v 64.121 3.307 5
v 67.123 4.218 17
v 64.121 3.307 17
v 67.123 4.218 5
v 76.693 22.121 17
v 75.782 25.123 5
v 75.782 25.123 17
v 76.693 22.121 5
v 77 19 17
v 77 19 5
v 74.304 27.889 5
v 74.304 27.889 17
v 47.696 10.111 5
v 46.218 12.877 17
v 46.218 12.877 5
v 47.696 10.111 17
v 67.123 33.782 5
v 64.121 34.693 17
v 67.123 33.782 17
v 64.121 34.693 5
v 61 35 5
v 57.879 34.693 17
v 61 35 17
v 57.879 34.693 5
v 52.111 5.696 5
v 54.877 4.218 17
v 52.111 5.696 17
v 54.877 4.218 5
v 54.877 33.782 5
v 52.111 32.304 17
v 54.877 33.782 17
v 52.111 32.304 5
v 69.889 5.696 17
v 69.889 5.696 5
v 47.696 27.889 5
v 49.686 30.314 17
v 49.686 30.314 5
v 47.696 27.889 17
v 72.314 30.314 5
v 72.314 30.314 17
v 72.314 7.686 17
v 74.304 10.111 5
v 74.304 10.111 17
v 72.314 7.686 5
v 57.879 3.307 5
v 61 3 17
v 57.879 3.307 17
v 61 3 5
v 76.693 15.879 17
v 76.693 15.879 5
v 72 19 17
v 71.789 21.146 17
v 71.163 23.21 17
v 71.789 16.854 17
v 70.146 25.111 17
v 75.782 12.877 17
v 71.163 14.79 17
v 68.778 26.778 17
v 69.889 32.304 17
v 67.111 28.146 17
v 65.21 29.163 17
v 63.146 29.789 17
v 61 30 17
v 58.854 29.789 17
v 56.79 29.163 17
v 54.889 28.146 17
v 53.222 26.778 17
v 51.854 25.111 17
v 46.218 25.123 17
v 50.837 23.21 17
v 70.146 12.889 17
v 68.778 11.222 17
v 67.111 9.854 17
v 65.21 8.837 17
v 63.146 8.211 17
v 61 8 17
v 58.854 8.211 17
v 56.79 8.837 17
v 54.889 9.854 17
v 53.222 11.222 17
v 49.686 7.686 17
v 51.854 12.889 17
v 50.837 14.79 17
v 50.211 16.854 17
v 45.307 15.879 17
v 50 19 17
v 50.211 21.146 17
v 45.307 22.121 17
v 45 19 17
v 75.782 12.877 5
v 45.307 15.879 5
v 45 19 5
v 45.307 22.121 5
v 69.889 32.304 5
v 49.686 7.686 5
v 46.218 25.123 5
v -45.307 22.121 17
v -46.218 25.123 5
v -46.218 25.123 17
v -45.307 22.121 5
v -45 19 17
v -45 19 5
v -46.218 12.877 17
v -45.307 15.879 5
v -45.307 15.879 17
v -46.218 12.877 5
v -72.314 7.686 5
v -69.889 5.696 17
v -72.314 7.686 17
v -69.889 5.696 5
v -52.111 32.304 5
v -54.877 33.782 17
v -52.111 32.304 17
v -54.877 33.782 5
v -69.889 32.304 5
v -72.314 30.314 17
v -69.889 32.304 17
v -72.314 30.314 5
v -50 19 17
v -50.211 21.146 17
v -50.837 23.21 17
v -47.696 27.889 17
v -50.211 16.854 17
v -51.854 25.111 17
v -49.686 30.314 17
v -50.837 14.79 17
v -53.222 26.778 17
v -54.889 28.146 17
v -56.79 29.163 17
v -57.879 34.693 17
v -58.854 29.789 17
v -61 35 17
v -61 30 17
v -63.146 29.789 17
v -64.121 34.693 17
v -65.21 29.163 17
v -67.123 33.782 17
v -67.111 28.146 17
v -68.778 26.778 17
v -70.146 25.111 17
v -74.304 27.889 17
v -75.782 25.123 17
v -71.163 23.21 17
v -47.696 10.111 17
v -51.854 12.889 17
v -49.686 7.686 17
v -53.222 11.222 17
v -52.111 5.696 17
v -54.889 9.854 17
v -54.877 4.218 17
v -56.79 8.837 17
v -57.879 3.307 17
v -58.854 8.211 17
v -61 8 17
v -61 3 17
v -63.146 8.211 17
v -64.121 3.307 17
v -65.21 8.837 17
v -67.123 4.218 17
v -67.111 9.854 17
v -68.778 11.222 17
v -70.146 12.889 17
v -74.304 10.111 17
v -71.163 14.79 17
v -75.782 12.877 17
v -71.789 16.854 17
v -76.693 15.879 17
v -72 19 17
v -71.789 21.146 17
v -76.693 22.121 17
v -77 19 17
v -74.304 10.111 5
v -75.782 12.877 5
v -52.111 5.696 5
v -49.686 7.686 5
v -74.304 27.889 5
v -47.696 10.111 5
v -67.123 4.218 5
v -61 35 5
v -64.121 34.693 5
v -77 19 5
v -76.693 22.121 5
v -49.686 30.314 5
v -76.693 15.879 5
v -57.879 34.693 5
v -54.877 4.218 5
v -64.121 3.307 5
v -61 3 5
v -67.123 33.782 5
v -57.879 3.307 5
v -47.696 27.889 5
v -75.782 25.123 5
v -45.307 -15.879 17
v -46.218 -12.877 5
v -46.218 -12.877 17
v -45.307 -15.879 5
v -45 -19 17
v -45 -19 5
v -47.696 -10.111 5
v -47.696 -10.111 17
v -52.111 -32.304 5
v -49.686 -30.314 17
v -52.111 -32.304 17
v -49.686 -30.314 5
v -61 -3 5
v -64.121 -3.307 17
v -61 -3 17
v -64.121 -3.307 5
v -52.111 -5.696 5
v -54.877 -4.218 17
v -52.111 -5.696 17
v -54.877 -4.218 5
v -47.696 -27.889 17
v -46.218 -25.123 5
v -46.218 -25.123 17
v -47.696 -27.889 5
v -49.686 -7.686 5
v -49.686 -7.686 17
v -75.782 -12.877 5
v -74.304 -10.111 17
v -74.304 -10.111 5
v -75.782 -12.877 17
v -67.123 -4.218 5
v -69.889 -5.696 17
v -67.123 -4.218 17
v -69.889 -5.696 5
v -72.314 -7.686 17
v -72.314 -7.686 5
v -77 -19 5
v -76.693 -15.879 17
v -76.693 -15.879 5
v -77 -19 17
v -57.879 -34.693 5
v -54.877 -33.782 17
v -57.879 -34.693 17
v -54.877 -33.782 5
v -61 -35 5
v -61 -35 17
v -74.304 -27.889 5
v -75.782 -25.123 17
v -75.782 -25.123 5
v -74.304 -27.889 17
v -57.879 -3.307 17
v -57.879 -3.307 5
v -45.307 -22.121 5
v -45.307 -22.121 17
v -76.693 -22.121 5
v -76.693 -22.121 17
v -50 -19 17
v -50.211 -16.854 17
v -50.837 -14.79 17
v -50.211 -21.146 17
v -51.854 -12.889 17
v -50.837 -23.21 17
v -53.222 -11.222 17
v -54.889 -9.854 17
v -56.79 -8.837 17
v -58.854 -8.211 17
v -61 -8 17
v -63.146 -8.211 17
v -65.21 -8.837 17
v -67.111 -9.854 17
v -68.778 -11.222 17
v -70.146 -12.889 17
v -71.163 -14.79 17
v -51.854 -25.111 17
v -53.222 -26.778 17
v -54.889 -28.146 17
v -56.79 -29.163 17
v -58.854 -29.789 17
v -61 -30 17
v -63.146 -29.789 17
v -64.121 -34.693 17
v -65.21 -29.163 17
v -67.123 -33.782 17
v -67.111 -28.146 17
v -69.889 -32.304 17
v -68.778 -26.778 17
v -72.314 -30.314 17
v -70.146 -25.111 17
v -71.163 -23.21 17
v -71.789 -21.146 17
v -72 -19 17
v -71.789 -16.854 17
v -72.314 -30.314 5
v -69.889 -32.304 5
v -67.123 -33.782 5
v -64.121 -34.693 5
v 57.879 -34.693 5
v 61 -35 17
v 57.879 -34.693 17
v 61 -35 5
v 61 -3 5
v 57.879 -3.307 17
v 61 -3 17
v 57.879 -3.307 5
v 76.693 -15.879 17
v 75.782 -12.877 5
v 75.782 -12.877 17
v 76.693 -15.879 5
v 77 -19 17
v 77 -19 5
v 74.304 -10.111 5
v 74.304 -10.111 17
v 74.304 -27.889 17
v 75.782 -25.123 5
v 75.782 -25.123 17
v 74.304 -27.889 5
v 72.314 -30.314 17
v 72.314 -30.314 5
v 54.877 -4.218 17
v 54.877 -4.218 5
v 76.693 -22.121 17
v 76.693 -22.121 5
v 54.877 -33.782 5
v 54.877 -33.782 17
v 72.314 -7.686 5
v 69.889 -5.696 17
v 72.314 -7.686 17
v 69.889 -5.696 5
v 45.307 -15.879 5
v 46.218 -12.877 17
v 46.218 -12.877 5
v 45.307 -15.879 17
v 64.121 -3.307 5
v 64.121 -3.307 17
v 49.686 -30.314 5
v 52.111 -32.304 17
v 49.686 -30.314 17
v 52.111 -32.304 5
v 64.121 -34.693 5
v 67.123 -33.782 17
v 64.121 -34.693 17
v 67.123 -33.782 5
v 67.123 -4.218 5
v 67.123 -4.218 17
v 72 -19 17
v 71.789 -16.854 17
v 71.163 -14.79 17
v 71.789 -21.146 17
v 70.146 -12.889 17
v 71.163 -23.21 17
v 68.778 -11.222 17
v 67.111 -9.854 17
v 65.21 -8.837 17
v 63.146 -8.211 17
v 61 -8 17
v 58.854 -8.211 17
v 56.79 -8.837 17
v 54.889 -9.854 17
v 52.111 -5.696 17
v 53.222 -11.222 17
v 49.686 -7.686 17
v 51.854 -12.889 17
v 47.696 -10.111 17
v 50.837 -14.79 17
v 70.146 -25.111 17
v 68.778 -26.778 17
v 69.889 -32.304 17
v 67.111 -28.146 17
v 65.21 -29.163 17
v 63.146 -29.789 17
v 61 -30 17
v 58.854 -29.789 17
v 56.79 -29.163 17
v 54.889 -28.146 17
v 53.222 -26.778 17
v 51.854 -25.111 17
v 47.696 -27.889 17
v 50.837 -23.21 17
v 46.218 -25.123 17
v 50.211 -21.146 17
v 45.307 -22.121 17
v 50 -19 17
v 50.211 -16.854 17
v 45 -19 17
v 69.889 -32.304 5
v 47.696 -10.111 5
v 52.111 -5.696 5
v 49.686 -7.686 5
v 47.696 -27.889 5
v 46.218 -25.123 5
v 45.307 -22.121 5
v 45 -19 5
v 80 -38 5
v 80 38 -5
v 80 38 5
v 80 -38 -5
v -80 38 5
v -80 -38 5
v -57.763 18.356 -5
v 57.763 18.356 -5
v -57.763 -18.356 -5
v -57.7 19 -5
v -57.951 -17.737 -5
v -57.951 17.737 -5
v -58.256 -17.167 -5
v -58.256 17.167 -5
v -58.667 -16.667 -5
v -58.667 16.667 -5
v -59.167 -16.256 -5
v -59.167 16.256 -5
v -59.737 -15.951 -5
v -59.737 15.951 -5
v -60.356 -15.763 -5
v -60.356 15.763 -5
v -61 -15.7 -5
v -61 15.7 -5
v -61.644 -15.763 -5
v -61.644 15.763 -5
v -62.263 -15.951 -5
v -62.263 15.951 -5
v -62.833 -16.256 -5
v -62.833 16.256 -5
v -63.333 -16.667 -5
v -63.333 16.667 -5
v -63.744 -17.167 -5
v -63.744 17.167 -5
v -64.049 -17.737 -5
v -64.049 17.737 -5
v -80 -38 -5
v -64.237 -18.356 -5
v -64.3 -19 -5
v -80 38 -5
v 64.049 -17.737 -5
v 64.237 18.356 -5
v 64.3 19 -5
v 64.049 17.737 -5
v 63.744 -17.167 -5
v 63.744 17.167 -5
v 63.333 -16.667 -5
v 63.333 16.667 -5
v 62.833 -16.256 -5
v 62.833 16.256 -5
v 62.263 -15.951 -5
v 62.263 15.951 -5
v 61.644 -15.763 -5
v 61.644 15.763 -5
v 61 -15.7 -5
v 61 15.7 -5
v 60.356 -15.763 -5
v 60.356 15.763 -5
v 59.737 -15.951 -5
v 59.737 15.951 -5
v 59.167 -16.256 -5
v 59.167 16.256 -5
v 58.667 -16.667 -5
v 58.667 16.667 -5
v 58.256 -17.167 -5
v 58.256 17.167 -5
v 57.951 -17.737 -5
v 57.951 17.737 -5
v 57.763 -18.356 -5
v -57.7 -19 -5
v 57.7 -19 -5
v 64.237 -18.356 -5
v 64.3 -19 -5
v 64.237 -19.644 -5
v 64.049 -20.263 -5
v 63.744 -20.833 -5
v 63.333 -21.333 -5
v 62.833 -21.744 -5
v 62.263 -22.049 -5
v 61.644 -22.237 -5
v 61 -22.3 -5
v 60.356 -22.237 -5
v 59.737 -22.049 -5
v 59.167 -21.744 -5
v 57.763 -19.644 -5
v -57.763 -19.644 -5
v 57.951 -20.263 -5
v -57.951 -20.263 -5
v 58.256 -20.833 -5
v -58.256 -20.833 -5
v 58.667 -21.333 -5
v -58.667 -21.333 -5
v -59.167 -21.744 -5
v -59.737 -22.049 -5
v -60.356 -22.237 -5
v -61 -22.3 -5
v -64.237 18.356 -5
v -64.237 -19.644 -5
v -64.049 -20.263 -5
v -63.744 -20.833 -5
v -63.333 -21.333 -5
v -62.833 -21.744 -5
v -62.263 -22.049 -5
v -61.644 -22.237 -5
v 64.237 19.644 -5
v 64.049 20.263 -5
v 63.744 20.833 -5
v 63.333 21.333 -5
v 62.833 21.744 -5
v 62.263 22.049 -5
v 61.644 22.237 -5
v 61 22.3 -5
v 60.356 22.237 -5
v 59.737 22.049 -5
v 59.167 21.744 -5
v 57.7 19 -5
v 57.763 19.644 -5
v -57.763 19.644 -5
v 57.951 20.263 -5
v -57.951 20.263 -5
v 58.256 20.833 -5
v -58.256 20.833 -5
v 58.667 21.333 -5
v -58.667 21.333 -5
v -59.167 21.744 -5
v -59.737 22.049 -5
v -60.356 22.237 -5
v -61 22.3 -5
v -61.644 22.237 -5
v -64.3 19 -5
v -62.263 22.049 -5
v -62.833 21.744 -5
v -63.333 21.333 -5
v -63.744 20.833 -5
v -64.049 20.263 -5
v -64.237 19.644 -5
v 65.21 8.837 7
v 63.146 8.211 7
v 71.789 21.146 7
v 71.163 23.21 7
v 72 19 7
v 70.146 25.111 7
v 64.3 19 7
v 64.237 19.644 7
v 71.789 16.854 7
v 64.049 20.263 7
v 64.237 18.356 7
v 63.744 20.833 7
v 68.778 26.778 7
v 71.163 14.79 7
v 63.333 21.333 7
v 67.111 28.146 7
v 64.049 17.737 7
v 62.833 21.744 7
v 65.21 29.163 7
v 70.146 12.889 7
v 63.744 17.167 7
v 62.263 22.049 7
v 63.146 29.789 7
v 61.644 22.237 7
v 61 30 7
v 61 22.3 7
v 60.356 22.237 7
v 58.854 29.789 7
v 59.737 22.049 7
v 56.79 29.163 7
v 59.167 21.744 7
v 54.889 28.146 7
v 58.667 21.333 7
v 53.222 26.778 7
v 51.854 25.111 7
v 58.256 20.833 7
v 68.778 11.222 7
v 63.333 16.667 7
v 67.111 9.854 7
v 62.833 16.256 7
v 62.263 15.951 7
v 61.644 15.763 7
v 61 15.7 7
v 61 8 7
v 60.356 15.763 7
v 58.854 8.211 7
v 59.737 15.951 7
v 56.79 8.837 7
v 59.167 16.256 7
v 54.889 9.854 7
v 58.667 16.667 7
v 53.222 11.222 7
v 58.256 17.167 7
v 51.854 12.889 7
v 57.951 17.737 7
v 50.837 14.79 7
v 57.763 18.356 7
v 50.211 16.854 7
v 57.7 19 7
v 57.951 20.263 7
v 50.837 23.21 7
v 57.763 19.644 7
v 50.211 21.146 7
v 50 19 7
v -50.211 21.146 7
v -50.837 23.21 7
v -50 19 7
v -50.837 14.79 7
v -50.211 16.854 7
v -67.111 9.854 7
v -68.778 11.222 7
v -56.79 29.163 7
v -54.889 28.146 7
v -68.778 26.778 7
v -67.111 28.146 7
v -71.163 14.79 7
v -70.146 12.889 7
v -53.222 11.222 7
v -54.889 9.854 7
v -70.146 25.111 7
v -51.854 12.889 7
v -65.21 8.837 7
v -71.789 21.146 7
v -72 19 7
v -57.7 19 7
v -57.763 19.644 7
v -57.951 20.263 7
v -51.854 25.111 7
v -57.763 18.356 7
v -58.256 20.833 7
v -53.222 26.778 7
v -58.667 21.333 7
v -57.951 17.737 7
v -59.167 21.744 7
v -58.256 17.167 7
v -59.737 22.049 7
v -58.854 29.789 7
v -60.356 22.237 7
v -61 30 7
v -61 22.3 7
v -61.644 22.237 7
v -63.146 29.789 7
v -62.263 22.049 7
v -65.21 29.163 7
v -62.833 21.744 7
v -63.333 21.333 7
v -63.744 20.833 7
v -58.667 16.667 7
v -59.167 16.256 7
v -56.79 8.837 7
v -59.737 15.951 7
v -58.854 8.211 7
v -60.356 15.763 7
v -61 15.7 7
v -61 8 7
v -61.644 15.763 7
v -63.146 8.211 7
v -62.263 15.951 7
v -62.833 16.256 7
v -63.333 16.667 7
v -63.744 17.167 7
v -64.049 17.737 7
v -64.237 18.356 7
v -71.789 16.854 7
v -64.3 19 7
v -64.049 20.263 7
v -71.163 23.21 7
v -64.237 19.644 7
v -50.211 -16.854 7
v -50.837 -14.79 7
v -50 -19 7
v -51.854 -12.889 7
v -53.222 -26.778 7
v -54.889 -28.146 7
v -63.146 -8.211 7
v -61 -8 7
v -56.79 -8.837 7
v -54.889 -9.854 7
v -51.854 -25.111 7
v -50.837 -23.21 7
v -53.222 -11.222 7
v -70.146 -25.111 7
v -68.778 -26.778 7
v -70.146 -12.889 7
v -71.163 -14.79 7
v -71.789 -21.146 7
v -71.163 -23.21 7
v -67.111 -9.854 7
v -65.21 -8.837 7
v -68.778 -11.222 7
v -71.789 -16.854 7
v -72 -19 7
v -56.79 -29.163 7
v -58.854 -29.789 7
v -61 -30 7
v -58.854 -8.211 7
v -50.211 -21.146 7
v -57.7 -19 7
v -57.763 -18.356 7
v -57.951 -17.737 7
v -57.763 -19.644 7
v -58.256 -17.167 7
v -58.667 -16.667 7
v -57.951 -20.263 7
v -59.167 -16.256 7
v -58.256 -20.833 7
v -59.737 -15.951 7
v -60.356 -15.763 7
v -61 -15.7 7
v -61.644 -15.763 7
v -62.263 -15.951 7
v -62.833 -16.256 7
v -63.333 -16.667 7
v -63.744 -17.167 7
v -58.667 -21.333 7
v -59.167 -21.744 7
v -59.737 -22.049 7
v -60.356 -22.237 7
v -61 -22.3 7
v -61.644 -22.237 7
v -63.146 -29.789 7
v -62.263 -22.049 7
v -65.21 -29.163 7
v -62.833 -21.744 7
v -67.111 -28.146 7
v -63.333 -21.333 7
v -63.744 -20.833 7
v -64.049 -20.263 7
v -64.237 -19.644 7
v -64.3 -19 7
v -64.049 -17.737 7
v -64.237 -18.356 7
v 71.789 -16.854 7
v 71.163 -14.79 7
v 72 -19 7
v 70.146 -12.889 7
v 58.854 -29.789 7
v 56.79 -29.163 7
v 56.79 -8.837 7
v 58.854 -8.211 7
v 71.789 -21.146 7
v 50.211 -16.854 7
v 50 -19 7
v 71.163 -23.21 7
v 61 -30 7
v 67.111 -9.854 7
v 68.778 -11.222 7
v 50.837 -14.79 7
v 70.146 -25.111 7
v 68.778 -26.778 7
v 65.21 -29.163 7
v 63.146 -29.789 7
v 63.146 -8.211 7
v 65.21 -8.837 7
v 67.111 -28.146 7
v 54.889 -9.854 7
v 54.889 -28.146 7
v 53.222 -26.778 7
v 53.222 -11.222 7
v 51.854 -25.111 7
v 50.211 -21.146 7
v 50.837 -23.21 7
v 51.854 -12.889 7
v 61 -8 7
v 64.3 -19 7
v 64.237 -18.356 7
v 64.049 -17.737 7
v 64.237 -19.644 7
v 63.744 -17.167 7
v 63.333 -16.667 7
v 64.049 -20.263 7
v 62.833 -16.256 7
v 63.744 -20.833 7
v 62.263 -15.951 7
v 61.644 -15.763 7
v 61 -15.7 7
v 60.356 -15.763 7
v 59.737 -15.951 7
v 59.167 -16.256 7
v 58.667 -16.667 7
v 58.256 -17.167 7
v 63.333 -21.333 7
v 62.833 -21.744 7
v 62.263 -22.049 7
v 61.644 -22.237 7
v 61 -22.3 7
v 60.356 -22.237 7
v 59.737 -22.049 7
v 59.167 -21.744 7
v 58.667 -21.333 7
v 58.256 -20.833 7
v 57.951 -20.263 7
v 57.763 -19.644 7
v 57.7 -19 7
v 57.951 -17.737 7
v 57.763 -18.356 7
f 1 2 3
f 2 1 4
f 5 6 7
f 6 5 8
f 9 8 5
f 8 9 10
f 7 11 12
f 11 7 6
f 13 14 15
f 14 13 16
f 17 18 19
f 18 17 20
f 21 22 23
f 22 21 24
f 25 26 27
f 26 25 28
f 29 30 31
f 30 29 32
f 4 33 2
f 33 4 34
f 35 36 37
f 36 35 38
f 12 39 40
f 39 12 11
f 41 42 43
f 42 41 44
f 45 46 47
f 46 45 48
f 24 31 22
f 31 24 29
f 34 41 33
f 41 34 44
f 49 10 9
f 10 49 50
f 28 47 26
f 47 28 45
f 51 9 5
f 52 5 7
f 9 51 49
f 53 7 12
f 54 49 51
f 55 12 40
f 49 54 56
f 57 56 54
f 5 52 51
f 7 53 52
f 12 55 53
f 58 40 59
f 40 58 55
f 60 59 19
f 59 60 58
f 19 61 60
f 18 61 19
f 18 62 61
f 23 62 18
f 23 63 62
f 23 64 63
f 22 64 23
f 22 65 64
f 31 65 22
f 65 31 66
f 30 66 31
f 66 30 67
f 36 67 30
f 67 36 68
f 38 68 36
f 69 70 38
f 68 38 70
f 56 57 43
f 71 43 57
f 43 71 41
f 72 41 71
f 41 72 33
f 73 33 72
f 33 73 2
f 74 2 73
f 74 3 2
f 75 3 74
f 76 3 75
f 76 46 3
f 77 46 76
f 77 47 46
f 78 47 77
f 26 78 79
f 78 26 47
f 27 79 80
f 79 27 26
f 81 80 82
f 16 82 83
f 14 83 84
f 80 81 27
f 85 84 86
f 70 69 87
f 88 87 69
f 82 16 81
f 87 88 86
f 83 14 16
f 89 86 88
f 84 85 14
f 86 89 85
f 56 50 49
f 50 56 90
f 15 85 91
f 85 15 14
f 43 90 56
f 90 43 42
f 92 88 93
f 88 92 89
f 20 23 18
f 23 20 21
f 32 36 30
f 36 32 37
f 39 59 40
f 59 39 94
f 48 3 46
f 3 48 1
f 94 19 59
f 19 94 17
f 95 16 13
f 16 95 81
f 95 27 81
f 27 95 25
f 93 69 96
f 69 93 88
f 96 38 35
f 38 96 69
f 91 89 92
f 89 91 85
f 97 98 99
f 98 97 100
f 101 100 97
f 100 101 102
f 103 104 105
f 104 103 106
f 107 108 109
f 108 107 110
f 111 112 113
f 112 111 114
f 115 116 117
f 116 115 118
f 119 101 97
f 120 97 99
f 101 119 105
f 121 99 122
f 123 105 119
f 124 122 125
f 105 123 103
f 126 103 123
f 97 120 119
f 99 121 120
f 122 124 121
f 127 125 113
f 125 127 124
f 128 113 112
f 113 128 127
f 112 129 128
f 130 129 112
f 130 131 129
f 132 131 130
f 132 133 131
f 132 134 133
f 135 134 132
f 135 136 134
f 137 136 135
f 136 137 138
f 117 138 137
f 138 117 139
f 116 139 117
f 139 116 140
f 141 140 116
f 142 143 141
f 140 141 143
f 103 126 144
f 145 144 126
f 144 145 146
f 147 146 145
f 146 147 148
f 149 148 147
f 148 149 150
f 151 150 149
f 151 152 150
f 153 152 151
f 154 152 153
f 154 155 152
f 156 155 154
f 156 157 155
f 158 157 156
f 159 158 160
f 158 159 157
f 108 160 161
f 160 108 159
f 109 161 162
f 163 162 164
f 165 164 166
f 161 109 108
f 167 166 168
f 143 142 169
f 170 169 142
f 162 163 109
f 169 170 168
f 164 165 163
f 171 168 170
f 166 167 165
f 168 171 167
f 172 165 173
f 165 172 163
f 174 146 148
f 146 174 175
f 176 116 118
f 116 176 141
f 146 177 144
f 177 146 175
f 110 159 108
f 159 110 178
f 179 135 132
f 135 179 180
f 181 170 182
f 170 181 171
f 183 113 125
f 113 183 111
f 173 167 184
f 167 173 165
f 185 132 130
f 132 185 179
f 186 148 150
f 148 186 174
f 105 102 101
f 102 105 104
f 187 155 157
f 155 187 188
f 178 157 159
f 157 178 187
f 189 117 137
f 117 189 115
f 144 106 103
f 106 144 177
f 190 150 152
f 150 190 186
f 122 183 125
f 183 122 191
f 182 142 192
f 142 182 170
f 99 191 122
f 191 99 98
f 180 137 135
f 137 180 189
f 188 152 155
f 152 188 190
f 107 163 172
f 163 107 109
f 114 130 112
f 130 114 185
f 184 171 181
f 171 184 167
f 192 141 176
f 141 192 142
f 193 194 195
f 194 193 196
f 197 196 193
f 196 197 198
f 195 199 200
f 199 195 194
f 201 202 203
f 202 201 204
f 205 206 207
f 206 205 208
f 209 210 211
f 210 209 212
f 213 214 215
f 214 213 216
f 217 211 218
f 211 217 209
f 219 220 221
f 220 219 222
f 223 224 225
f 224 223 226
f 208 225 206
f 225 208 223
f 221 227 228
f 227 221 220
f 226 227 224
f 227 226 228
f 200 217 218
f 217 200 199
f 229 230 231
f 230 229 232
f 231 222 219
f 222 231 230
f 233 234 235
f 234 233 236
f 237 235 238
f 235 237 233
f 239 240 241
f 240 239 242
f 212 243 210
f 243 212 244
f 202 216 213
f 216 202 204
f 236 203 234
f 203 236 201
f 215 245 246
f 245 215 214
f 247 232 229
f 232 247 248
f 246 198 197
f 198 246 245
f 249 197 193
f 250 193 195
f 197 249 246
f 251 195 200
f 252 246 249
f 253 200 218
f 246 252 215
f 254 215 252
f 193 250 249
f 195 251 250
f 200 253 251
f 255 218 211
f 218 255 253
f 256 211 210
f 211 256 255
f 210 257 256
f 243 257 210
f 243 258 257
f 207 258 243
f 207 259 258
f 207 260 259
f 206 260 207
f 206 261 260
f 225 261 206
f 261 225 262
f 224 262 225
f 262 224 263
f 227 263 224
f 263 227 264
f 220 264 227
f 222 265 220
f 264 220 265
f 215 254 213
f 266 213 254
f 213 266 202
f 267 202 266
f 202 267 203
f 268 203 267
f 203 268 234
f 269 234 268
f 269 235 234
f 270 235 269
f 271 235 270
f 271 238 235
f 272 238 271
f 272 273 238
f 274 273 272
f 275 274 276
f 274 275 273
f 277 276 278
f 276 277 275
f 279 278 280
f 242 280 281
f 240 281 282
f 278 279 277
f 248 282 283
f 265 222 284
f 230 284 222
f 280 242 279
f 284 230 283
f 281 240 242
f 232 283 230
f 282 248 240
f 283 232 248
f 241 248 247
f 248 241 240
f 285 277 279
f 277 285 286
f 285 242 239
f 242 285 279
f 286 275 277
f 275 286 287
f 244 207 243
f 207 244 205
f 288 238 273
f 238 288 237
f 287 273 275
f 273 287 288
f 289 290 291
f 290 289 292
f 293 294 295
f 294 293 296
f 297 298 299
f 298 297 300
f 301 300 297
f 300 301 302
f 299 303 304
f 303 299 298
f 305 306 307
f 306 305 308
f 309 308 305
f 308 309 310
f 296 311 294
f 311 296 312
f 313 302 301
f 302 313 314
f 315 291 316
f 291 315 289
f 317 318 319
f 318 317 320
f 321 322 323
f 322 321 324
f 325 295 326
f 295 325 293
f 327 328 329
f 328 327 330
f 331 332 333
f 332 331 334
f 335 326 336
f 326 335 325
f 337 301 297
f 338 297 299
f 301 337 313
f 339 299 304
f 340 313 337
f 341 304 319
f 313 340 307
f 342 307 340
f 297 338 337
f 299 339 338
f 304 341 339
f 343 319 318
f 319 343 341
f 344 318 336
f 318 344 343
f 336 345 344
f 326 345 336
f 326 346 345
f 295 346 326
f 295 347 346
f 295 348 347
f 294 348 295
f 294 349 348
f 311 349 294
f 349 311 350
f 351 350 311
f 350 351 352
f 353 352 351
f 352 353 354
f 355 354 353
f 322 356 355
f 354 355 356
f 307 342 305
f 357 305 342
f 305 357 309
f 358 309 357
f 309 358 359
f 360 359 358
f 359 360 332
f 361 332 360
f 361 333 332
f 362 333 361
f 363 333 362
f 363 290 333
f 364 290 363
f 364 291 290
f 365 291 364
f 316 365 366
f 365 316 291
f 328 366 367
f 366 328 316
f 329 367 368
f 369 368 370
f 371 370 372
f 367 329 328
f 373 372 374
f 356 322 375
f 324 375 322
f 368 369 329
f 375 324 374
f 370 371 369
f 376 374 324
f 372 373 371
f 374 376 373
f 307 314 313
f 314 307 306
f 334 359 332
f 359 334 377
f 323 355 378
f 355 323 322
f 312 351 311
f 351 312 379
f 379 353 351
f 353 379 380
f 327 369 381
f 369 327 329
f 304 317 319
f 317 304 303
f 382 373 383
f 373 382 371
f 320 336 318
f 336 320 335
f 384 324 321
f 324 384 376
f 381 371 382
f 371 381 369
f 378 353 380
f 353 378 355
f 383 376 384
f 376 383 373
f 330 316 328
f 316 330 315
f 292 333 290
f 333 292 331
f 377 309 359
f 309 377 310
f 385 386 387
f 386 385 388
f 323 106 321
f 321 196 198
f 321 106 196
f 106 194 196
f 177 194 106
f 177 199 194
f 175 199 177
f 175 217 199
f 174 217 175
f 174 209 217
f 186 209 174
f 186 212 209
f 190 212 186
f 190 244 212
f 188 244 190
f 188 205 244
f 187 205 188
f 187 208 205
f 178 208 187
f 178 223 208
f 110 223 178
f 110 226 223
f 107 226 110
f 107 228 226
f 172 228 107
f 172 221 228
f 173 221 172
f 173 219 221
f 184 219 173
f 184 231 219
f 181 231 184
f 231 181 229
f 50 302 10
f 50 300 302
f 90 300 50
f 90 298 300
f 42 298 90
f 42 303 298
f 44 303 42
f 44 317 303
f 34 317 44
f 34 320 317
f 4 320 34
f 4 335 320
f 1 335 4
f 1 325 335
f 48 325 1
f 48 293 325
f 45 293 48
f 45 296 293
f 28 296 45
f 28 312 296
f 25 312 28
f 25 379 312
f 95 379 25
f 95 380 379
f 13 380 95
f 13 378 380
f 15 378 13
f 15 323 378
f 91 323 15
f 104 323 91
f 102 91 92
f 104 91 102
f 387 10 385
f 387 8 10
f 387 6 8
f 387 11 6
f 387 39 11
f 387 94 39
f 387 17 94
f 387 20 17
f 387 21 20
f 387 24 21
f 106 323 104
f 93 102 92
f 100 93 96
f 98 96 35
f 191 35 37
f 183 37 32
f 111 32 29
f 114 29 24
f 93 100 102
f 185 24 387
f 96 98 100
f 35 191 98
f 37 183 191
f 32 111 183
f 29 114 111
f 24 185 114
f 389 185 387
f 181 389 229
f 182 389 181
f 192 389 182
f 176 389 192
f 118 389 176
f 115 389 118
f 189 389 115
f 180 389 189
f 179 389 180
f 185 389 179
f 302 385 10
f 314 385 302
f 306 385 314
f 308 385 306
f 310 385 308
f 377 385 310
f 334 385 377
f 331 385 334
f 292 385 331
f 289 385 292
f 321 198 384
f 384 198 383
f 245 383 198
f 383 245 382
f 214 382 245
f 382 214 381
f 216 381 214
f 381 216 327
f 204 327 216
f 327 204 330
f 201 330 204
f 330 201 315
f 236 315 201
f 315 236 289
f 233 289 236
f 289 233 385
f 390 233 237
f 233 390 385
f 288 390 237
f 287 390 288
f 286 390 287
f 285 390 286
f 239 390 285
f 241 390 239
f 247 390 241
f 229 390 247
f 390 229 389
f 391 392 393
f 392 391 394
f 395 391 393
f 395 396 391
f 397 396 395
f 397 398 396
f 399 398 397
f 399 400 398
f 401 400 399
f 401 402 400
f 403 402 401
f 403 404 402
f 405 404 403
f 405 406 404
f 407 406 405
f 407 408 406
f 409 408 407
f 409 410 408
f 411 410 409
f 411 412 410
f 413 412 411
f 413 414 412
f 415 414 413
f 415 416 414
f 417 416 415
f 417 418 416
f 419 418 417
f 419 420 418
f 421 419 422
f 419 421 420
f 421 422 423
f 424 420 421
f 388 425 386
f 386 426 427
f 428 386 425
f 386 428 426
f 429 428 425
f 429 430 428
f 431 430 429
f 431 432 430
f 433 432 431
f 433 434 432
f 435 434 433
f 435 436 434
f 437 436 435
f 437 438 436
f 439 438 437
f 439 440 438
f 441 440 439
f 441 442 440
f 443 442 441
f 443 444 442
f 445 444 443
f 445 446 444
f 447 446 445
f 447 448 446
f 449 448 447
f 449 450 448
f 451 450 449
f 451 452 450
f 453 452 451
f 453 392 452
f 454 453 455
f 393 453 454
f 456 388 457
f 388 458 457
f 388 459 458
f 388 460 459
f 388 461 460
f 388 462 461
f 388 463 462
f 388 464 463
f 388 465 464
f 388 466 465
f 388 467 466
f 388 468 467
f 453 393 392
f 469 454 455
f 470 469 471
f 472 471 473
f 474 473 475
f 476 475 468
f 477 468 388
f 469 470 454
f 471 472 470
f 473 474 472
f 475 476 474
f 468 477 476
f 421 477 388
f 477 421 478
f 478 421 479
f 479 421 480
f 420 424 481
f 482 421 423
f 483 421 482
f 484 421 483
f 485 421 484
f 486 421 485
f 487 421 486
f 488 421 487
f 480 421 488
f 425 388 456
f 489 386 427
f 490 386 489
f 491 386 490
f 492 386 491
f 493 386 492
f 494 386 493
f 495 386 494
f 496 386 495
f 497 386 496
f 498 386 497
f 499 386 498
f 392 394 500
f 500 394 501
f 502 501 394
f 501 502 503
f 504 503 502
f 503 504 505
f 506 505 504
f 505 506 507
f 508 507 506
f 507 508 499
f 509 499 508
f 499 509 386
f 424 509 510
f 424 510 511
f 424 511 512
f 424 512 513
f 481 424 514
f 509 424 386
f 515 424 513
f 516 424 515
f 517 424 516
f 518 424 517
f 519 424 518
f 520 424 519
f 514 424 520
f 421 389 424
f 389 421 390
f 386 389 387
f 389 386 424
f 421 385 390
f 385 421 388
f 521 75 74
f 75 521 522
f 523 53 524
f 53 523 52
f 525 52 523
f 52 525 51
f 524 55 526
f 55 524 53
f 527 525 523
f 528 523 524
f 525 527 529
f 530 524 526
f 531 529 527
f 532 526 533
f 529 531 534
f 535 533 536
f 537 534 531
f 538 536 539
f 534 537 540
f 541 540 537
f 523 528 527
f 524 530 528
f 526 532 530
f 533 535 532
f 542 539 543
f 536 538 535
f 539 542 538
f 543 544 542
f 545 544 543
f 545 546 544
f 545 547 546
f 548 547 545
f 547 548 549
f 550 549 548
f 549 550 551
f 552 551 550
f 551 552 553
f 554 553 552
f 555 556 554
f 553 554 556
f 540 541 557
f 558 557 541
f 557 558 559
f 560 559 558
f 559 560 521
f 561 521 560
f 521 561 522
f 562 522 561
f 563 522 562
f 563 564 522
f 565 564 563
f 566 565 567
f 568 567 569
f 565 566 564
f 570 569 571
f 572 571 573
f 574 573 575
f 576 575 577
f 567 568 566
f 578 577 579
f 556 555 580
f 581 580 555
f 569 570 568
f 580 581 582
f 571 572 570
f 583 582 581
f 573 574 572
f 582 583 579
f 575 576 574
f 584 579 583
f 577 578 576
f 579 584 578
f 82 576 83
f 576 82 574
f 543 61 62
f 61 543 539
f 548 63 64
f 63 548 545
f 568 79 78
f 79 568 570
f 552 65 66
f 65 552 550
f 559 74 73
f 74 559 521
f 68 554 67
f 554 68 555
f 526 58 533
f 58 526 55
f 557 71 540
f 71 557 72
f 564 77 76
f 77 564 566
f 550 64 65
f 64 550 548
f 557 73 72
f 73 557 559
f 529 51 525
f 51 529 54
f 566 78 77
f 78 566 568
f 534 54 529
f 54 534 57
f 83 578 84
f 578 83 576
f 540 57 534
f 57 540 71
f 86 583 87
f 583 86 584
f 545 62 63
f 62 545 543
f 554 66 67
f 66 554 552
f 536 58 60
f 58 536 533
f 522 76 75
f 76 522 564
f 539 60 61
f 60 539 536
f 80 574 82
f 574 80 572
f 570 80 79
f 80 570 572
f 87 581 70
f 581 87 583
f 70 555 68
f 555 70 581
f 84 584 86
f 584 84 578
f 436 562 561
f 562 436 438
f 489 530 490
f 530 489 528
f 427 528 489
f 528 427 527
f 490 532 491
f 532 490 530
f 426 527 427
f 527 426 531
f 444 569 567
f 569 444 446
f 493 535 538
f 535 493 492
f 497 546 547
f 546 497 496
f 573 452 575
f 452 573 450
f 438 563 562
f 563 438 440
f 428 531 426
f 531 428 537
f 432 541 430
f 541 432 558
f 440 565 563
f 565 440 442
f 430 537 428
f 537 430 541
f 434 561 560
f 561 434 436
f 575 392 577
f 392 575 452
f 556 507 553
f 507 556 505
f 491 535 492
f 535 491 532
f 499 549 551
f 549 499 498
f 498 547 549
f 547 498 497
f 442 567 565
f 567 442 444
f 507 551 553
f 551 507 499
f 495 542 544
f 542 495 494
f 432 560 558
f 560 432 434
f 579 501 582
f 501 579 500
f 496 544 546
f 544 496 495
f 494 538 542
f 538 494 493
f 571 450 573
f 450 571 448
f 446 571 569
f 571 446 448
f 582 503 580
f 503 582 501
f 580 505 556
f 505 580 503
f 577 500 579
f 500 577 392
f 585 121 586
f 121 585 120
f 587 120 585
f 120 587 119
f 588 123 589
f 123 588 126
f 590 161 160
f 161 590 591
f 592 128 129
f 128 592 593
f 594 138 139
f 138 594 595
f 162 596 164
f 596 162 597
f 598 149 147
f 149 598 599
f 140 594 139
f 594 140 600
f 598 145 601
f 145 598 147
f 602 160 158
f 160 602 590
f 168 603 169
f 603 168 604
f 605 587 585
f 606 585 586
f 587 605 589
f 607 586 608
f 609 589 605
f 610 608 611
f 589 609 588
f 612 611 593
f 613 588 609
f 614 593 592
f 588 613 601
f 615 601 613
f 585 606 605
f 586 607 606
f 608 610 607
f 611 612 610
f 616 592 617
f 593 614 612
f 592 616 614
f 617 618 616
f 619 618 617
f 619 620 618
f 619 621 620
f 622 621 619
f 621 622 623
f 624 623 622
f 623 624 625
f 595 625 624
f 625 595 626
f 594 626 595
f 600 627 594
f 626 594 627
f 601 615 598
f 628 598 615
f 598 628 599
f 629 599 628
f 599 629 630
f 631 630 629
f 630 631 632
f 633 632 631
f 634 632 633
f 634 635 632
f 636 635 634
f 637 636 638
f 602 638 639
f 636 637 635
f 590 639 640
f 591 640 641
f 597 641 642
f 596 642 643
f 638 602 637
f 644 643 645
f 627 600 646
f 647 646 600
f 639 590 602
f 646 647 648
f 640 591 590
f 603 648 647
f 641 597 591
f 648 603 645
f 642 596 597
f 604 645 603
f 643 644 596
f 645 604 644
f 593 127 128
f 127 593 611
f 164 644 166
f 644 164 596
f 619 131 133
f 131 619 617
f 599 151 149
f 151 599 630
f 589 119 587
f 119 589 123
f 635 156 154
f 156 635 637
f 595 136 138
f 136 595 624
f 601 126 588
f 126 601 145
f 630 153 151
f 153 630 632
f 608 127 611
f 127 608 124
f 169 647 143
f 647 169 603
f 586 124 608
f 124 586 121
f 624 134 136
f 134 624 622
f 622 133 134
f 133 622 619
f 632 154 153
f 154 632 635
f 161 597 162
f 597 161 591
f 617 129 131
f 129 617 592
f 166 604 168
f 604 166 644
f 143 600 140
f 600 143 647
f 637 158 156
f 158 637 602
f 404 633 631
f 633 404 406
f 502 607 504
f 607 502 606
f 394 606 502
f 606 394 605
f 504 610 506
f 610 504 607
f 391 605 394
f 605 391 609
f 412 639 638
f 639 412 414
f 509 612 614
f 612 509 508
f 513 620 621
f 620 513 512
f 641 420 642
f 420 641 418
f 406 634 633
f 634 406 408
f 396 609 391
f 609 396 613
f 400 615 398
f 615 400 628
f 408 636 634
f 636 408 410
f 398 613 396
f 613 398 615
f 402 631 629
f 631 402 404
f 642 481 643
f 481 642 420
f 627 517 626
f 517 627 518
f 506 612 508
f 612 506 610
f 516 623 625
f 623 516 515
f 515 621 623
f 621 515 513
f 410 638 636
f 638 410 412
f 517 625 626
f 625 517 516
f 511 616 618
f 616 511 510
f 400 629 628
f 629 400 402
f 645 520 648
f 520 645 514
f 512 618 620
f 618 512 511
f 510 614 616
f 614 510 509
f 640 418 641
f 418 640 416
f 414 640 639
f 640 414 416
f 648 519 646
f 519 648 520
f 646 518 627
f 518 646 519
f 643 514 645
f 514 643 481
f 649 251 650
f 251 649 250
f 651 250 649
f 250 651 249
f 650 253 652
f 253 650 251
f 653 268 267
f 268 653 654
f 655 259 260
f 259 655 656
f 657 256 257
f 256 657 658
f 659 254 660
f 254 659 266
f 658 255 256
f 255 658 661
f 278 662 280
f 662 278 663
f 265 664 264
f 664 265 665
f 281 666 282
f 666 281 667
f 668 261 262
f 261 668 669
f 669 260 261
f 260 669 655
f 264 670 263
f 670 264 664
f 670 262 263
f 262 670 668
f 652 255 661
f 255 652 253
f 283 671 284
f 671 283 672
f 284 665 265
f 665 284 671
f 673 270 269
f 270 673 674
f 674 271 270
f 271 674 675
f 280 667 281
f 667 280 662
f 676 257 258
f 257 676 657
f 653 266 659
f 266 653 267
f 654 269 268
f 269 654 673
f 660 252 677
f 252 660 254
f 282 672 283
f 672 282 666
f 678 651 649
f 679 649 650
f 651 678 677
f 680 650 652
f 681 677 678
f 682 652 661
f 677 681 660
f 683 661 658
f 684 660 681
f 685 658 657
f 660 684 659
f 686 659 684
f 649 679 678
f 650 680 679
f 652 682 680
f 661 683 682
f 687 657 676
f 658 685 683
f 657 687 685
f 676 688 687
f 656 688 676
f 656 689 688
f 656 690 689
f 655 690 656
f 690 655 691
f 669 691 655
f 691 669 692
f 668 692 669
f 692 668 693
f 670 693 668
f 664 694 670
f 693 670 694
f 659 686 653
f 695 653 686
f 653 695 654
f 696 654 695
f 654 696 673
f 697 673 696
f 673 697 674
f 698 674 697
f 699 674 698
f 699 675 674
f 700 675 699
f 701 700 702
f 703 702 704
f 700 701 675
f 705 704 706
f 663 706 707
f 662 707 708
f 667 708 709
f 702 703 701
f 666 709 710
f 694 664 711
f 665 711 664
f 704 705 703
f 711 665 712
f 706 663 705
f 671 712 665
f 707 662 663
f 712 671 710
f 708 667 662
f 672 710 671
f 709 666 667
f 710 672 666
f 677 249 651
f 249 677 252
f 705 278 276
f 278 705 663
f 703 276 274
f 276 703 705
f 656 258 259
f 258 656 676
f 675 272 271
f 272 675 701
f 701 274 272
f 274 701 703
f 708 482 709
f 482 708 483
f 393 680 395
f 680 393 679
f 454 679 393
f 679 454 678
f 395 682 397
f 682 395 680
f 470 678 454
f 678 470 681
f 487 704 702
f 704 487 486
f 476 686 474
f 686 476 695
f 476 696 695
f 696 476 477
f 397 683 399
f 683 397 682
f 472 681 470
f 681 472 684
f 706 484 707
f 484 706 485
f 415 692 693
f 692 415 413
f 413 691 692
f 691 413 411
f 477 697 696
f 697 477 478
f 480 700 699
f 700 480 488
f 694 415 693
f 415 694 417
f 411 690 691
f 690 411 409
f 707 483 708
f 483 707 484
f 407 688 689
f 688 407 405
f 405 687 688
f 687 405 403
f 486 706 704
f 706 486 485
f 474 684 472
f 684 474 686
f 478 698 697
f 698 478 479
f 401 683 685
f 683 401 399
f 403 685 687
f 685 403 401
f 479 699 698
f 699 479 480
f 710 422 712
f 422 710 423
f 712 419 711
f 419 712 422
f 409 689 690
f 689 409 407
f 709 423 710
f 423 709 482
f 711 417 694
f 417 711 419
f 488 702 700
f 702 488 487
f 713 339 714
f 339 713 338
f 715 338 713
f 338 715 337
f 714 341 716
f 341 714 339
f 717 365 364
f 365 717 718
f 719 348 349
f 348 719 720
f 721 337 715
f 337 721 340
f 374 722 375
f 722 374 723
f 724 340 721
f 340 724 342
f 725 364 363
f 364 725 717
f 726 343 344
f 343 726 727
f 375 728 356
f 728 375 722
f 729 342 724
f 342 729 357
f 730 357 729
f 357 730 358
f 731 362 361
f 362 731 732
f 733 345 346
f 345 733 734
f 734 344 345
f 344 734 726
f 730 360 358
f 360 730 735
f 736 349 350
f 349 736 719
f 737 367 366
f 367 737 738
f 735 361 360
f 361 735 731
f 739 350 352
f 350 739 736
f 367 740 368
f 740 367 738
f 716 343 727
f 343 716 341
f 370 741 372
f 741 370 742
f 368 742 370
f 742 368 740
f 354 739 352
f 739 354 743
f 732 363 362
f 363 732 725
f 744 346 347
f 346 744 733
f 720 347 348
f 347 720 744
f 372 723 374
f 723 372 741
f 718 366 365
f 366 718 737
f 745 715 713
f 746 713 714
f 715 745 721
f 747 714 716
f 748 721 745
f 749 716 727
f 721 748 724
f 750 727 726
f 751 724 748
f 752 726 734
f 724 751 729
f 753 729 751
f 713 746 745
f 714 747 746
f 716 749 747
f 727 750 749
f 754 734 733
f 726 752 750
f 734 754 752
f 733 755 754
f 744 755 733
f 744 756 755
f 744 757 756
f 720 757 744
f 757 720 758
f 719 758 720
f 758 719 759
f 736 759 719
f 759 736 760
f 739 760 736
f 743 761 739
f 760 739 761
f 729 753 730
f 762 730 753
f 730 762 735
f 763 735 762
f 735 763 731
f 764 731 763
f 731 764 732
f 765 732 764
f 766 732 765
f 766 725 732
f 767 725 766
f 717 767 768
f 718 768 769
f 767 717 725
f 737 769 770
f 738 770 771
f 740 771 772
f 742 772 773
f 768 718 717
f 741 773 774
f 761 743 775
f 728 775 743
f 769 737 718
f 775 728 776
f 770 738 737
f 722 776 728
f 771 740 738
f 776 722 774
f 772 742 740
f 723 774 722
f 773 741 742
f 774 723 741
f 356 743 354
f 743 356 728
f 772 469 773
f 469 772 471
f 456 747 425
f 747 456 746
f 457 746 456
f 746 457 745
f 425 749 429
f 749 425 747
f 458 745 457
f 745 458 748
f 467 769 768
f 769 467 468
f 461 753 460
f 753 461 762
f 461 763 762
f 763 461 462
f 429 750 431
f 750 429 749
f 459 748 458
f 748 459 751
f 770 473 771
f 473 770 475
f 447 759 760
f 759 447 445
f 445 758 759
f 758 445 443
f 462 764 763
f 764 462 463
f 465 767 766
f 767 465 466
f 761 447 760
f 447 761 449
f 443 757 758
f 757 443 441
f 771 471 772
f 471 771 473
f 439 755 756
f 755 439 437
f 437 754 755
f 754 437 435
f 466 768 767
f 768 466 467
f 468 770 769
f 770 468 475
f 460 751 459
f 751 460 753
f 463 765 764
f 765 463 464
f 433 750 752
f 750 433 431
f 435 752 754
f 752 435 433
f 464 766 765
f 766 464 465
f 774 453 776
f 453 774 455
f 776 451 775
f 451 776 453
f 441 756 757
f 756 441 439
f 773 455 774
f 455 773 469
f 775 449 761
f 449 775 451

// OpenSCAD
$fn = 32;

// ----------------------------------------------------------------------
// Socket pad plate
// bosses with counterbored sockets for the screws
// ----------------------------------------------------------------------

// --- parameters (mm) ---
base_t = 10;            // base plate thickness
boss_h = 12;            // boss height above the base plate
boss_d = 32;            // boss diameter
socket_d = 22;          // socket diameter
socket_depth = 10;      // socket depth from the boss face
bolt_d = 6.6;           // screw clearance hole through the socket floor
plate = [160, 76, 10];  // overall size (x, y, z)
edge = 19;              // boss centre offset from the plate edge
pads = 4;               // boss count, one per corner

// --- derived feature positions (mm) ---
height = base_t + boss_h;        // = 22   overall height of the part
corner_x = plate[0] / 2 - edge;  // = 61   boss centre X
corner_y = plate[1] / 2 - edge;  // = 19   boss centre Y
feature_centers = [
  [corner_x, corner_y],
  [-corner_x, corner_y],
  [-corner_x, -corner_y],
  [corner_x, -corner_y]
];   // boss centres: sockets, holes and the pads themselves are placed from here

// base plate, bosses on feature_centers, socket + through hole in each
difference() {
  union() {
    cube(plate, center = true);
    for (centre = feature_centers)
      translate([centre[0], centre[1], plate[2] / 2 - 1])
        cylinder(d = boss_d, h = boss_h + 1);
  }
  for (centre = feature_centers) {
    translate([centre[0], centre[1], plate[2] / 2 + boss_h - socket_depth])
      cylinder(d = socket_d, h = socket_depth + 1);
    translate([centre[0], centre[1], -height])
      cylinder(d = bolt_d, h = 2 * height + 2);  // through the socket floor
  }
}
